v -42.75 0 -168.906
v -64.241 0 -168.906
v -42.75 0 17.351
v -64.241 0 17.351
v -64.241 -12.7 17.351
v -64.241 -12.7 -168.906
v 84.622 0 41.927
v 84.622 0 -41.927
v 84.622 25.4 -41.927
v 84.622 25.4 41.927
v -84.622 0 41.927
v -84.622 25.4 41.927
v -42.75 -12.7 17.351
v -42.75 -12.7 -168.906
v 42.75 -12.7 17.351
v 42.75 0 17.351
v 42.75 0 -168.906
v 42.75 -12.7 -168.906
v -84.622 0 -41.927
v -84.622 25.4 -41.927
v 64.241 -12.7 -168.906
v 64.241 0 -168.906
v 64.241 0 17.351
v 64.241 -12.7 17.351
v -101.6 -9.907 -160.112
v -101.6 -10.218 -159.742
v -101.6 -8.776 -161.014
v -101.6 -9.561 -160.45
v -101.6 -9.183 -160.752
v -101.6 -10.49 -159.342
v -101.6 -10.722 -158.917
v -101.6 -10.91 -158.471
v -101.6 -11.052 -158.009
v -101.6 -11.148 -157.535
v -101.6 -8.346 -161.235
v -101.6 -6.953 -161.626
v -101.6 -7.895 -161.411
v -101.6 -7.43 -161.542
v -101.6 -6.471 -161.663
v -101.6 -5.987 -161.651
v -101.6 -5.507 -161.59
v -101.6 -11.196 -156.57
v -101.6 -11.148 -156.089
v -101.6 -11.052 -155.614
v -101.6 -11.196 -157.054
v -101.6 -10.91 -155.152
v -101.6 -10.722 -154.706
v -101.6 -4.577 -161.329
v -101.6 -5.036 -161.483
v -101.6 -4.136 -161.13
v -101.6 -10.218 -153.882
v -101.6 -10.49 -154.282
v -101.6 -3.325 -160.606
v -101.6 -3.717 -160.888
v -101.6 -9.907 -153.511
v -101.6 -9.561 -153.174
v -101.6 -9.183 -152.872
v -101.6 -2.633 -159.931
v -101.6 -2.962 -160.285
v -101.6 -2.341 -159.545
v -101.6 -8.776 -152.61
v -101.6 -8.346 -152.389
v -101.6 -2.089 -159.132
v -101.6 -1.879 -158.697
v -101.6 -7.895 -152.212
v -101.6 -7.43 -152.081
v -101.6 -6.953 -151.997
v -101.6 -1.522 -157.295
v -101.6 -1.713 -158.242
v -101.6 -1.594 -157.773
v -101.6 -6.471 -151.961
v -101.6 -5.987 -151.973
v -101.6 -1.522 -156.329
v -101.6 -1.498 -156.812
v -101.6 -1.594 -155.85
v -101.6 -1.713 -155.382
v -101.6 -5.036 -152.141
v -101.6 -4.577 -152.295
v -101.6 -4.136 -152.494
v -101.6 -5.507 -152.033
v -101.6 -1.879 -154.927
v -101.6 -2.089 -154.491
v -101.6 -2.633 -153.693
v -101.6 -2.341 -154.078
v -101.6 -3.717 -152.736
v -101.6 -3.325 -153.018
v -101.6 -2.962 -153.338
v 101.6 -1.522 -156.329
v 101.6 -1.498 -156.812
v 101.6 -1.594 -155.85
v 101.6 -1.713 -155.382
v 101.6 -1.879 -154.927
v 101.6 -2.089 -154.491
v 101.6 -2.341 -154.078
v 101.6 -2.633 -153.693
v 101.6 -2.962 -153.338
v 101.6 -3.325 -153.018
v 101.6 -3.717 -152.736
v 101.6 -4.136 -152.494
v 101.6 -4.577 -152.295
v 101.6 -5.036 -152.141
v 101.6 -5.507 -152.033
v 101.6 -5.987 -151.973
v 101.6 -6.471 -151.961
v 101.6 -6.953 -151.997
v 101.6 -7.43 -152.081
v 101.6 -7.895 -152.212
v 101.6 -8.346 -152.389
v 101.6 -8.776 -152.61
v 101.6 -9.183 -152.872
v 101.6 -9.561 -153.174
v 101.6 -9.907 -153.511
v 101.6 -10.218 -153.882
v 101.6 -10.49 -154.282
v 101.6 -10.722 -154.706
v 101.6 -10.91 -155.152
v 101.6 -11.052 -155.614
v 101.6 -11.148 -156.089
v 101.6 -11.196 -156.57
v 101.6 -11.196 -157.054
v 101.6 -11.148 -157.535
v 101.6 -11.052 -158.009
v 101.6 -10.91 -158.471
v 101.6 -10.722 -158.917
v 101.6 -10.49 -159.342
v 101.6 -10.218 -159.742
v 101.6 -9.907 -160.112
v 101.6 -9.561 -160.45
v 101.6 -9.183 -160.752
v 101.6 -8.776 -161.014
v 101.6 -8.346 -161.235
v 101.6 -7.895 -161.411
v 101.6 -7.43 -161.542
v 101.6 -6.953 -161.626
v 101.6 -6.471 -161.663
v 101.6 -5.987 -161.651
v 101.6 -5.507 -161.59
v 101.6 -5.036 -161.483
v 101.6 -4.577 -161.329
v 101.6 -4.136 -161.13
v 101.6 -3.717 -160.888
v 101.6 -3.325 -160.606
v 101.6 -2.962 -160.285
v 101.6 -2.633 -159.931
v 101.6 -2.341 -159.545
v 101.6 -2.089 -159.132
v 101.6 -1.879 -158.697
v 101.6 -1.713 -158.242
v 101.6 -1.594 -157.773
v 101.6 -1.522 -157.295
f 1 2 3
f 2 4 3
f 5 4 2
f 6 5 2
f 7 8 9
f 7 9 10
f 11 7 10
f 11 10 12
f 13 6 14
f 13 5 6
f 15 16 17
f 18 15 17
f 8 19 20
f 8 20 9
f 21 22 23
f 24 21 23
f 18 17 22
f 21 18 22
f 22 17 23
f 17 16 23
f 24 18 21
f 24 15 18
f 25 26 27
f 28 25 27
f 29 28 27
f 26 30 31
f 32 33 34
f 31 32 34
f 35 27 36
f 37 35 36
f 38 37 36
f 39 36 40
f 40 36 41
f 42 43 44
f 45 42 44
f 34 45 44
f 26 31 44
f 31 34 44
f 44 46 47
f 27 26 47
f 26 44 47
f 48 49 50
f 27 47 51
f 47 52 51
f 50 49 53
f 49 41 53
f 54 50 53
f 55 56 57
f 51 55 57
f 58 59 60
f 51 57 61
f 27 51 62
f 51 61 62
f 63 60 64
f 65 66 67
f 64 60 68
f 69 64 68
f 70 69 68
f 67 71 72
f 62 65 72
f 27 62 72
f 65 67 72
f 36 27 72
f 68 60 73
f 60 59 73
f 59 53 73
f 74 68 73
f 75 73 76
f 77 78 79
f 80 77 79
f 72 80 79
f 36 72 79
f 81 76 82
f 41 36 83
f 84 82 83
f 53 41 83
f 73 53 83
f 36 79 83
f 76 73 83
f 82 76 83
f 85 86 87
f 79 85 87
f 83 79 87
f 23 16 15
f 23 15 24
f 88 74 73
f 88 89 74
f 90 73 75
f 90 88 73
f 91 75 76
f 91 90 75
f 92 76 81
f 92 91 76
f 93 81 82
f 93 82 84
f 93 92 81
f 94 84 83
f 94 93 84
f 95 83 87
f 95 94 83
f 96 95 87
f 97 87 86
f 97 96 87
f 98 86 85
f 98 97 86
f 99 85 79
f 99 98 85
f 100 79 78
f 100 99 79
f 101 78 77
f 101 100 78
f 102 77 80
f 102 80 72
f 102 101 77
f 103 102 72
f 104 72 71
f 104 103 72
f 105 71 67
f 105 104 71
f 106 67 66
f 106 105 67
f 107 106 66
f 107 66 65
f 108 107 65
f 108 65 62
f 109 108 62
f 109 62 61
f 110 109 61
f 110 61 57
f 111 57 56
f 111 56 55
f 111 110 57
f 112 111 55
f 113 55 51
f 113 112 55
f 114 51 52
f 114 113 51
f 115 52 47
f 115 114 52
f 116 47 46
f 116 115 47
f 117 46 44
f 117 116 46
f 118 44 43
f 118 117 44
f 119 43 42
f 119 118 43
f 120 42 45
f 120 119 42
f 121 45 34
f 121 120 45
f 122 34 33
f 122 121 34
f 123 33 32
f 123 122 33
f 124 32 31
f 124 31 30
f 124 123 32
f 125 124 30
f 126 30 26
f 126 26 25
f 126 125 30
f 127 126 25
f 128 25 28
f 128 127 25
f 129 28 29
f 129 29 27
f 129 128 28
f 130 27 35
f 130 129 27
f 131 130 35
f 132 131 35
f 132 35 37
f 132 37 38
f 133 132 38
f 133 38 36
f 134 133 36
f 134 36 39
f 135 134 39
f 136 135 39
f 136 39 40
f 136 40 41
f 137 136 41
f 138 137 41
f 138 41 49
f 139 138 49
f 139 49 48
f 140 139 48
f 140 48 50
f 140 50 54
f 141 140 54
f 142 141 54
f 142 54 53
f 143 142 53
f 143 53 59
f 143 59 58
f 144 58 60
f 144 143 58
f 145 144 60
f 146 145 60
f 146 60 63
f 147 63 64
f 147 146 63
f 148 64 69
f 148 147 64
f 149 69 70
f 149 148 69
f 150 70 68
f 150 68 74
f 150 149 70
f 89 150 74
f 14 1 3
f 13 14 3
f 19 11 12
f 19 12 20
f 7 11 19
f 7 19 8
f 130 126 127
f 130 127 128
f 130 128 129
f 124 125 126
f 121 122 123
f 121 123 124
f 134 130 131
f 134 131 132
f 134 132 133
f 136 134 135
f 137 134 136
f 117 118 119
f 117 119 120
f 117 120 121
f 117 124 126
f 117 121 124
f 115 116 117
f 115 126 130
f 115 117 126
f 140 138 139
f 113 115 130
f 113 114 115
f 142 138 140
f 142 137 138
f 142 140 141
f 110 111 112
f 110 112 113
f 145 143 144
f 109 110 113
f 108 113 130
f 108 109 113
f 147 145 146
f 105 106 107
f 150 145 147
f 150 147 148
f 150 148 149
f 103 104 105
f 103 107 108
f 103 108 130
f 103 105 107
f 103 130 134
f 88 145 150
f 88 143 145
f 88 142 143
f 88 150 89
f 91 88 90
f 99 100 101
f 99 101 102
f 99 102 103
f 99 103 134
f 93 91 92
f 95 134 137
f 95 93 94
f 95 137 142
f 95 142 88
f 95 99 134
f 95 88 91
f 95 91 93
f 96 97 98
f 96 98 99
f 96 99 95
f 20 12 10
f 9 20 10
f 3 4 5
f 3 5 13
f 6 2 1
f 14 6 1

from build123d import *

# Parameters (mm, degrees)
F0_W     = 21.4911662042
F0_H     = 59.2786279198
F1_DEPTH = 25.4
F0_H_2   = 126.9783861313
F2_DEPTH = 12.7
F3_R     = 4.8523486622
F4_DEPTH = 101.6


with BuildPart() as f1:
    # F0 (on Front) → F1 (new body)
    with BuildSketch(Plane.XZ):
        Polygon((84.6221148968, 41.9272296753), (-84.6221148968, 41.9272296753), (-84.6221148968, -41.9272296753), (-64.241476357, -41.9272296753), (-64.241476357, 17.3513982445), (-42.7503101528, 17.3513982445), (-42.7503101528, -41.9272296753), (42.7503101528, -41.9272296753), (42.7503101528, 17.3513982445), (64.241476357, 17.3513982445), (64.241476357, -41.9272296753), (84.6221148968, -41.9272296753), align=None)
        with Locations((-53.4958932549, -12.2879157154)):
            Rectangle(F0_W, F0_H)
        with Locations((53.4958932549, -12.2879157154)):
            Rectangle(F0_W, F0_H)
    extrude(amount=-F1_DEPTH)


with BuildPart() as f2:
    # F0 (on Front) → F2 (new body)
    with BuildSketch(Plane.XZ):
        with Locations((-53.4958932549, -105.4164227409)):
            Rectangle(F0_W, F0_H_2)
        with Locations((-53.4958932549, -12.2879157154)):
            Rectangle(F0_W, F0_H)
    extrude(amount=F2_DEPTH)


with BuildPart() as f2b:
    # F0 (on Front) → F2, piece 2 (new body)
    with BuildSketch(Plane.XZ):
        with Locations((53.4958932549, -105.4164227409)):
            Rectangle(F0_W, F0_H_2)
        with Locations((53.4958932549, -12.2879157154)):
            Rectangle(F0_W, F0_H)
    extrude(amount=F2_DEPTH)


with BuildPart() as f4:
    # F3 (on Right) → F4 (new body, symmetric)
    with BuildSketch(Plane.YZ):
        with Locations((-6.35, -156.8118035793)):
            Circle(F3_R)
    extrude(amount=F4_DEPTH, both=True)


solid = Compound([f1.part, f2.part, f2b.part, f4.part])
